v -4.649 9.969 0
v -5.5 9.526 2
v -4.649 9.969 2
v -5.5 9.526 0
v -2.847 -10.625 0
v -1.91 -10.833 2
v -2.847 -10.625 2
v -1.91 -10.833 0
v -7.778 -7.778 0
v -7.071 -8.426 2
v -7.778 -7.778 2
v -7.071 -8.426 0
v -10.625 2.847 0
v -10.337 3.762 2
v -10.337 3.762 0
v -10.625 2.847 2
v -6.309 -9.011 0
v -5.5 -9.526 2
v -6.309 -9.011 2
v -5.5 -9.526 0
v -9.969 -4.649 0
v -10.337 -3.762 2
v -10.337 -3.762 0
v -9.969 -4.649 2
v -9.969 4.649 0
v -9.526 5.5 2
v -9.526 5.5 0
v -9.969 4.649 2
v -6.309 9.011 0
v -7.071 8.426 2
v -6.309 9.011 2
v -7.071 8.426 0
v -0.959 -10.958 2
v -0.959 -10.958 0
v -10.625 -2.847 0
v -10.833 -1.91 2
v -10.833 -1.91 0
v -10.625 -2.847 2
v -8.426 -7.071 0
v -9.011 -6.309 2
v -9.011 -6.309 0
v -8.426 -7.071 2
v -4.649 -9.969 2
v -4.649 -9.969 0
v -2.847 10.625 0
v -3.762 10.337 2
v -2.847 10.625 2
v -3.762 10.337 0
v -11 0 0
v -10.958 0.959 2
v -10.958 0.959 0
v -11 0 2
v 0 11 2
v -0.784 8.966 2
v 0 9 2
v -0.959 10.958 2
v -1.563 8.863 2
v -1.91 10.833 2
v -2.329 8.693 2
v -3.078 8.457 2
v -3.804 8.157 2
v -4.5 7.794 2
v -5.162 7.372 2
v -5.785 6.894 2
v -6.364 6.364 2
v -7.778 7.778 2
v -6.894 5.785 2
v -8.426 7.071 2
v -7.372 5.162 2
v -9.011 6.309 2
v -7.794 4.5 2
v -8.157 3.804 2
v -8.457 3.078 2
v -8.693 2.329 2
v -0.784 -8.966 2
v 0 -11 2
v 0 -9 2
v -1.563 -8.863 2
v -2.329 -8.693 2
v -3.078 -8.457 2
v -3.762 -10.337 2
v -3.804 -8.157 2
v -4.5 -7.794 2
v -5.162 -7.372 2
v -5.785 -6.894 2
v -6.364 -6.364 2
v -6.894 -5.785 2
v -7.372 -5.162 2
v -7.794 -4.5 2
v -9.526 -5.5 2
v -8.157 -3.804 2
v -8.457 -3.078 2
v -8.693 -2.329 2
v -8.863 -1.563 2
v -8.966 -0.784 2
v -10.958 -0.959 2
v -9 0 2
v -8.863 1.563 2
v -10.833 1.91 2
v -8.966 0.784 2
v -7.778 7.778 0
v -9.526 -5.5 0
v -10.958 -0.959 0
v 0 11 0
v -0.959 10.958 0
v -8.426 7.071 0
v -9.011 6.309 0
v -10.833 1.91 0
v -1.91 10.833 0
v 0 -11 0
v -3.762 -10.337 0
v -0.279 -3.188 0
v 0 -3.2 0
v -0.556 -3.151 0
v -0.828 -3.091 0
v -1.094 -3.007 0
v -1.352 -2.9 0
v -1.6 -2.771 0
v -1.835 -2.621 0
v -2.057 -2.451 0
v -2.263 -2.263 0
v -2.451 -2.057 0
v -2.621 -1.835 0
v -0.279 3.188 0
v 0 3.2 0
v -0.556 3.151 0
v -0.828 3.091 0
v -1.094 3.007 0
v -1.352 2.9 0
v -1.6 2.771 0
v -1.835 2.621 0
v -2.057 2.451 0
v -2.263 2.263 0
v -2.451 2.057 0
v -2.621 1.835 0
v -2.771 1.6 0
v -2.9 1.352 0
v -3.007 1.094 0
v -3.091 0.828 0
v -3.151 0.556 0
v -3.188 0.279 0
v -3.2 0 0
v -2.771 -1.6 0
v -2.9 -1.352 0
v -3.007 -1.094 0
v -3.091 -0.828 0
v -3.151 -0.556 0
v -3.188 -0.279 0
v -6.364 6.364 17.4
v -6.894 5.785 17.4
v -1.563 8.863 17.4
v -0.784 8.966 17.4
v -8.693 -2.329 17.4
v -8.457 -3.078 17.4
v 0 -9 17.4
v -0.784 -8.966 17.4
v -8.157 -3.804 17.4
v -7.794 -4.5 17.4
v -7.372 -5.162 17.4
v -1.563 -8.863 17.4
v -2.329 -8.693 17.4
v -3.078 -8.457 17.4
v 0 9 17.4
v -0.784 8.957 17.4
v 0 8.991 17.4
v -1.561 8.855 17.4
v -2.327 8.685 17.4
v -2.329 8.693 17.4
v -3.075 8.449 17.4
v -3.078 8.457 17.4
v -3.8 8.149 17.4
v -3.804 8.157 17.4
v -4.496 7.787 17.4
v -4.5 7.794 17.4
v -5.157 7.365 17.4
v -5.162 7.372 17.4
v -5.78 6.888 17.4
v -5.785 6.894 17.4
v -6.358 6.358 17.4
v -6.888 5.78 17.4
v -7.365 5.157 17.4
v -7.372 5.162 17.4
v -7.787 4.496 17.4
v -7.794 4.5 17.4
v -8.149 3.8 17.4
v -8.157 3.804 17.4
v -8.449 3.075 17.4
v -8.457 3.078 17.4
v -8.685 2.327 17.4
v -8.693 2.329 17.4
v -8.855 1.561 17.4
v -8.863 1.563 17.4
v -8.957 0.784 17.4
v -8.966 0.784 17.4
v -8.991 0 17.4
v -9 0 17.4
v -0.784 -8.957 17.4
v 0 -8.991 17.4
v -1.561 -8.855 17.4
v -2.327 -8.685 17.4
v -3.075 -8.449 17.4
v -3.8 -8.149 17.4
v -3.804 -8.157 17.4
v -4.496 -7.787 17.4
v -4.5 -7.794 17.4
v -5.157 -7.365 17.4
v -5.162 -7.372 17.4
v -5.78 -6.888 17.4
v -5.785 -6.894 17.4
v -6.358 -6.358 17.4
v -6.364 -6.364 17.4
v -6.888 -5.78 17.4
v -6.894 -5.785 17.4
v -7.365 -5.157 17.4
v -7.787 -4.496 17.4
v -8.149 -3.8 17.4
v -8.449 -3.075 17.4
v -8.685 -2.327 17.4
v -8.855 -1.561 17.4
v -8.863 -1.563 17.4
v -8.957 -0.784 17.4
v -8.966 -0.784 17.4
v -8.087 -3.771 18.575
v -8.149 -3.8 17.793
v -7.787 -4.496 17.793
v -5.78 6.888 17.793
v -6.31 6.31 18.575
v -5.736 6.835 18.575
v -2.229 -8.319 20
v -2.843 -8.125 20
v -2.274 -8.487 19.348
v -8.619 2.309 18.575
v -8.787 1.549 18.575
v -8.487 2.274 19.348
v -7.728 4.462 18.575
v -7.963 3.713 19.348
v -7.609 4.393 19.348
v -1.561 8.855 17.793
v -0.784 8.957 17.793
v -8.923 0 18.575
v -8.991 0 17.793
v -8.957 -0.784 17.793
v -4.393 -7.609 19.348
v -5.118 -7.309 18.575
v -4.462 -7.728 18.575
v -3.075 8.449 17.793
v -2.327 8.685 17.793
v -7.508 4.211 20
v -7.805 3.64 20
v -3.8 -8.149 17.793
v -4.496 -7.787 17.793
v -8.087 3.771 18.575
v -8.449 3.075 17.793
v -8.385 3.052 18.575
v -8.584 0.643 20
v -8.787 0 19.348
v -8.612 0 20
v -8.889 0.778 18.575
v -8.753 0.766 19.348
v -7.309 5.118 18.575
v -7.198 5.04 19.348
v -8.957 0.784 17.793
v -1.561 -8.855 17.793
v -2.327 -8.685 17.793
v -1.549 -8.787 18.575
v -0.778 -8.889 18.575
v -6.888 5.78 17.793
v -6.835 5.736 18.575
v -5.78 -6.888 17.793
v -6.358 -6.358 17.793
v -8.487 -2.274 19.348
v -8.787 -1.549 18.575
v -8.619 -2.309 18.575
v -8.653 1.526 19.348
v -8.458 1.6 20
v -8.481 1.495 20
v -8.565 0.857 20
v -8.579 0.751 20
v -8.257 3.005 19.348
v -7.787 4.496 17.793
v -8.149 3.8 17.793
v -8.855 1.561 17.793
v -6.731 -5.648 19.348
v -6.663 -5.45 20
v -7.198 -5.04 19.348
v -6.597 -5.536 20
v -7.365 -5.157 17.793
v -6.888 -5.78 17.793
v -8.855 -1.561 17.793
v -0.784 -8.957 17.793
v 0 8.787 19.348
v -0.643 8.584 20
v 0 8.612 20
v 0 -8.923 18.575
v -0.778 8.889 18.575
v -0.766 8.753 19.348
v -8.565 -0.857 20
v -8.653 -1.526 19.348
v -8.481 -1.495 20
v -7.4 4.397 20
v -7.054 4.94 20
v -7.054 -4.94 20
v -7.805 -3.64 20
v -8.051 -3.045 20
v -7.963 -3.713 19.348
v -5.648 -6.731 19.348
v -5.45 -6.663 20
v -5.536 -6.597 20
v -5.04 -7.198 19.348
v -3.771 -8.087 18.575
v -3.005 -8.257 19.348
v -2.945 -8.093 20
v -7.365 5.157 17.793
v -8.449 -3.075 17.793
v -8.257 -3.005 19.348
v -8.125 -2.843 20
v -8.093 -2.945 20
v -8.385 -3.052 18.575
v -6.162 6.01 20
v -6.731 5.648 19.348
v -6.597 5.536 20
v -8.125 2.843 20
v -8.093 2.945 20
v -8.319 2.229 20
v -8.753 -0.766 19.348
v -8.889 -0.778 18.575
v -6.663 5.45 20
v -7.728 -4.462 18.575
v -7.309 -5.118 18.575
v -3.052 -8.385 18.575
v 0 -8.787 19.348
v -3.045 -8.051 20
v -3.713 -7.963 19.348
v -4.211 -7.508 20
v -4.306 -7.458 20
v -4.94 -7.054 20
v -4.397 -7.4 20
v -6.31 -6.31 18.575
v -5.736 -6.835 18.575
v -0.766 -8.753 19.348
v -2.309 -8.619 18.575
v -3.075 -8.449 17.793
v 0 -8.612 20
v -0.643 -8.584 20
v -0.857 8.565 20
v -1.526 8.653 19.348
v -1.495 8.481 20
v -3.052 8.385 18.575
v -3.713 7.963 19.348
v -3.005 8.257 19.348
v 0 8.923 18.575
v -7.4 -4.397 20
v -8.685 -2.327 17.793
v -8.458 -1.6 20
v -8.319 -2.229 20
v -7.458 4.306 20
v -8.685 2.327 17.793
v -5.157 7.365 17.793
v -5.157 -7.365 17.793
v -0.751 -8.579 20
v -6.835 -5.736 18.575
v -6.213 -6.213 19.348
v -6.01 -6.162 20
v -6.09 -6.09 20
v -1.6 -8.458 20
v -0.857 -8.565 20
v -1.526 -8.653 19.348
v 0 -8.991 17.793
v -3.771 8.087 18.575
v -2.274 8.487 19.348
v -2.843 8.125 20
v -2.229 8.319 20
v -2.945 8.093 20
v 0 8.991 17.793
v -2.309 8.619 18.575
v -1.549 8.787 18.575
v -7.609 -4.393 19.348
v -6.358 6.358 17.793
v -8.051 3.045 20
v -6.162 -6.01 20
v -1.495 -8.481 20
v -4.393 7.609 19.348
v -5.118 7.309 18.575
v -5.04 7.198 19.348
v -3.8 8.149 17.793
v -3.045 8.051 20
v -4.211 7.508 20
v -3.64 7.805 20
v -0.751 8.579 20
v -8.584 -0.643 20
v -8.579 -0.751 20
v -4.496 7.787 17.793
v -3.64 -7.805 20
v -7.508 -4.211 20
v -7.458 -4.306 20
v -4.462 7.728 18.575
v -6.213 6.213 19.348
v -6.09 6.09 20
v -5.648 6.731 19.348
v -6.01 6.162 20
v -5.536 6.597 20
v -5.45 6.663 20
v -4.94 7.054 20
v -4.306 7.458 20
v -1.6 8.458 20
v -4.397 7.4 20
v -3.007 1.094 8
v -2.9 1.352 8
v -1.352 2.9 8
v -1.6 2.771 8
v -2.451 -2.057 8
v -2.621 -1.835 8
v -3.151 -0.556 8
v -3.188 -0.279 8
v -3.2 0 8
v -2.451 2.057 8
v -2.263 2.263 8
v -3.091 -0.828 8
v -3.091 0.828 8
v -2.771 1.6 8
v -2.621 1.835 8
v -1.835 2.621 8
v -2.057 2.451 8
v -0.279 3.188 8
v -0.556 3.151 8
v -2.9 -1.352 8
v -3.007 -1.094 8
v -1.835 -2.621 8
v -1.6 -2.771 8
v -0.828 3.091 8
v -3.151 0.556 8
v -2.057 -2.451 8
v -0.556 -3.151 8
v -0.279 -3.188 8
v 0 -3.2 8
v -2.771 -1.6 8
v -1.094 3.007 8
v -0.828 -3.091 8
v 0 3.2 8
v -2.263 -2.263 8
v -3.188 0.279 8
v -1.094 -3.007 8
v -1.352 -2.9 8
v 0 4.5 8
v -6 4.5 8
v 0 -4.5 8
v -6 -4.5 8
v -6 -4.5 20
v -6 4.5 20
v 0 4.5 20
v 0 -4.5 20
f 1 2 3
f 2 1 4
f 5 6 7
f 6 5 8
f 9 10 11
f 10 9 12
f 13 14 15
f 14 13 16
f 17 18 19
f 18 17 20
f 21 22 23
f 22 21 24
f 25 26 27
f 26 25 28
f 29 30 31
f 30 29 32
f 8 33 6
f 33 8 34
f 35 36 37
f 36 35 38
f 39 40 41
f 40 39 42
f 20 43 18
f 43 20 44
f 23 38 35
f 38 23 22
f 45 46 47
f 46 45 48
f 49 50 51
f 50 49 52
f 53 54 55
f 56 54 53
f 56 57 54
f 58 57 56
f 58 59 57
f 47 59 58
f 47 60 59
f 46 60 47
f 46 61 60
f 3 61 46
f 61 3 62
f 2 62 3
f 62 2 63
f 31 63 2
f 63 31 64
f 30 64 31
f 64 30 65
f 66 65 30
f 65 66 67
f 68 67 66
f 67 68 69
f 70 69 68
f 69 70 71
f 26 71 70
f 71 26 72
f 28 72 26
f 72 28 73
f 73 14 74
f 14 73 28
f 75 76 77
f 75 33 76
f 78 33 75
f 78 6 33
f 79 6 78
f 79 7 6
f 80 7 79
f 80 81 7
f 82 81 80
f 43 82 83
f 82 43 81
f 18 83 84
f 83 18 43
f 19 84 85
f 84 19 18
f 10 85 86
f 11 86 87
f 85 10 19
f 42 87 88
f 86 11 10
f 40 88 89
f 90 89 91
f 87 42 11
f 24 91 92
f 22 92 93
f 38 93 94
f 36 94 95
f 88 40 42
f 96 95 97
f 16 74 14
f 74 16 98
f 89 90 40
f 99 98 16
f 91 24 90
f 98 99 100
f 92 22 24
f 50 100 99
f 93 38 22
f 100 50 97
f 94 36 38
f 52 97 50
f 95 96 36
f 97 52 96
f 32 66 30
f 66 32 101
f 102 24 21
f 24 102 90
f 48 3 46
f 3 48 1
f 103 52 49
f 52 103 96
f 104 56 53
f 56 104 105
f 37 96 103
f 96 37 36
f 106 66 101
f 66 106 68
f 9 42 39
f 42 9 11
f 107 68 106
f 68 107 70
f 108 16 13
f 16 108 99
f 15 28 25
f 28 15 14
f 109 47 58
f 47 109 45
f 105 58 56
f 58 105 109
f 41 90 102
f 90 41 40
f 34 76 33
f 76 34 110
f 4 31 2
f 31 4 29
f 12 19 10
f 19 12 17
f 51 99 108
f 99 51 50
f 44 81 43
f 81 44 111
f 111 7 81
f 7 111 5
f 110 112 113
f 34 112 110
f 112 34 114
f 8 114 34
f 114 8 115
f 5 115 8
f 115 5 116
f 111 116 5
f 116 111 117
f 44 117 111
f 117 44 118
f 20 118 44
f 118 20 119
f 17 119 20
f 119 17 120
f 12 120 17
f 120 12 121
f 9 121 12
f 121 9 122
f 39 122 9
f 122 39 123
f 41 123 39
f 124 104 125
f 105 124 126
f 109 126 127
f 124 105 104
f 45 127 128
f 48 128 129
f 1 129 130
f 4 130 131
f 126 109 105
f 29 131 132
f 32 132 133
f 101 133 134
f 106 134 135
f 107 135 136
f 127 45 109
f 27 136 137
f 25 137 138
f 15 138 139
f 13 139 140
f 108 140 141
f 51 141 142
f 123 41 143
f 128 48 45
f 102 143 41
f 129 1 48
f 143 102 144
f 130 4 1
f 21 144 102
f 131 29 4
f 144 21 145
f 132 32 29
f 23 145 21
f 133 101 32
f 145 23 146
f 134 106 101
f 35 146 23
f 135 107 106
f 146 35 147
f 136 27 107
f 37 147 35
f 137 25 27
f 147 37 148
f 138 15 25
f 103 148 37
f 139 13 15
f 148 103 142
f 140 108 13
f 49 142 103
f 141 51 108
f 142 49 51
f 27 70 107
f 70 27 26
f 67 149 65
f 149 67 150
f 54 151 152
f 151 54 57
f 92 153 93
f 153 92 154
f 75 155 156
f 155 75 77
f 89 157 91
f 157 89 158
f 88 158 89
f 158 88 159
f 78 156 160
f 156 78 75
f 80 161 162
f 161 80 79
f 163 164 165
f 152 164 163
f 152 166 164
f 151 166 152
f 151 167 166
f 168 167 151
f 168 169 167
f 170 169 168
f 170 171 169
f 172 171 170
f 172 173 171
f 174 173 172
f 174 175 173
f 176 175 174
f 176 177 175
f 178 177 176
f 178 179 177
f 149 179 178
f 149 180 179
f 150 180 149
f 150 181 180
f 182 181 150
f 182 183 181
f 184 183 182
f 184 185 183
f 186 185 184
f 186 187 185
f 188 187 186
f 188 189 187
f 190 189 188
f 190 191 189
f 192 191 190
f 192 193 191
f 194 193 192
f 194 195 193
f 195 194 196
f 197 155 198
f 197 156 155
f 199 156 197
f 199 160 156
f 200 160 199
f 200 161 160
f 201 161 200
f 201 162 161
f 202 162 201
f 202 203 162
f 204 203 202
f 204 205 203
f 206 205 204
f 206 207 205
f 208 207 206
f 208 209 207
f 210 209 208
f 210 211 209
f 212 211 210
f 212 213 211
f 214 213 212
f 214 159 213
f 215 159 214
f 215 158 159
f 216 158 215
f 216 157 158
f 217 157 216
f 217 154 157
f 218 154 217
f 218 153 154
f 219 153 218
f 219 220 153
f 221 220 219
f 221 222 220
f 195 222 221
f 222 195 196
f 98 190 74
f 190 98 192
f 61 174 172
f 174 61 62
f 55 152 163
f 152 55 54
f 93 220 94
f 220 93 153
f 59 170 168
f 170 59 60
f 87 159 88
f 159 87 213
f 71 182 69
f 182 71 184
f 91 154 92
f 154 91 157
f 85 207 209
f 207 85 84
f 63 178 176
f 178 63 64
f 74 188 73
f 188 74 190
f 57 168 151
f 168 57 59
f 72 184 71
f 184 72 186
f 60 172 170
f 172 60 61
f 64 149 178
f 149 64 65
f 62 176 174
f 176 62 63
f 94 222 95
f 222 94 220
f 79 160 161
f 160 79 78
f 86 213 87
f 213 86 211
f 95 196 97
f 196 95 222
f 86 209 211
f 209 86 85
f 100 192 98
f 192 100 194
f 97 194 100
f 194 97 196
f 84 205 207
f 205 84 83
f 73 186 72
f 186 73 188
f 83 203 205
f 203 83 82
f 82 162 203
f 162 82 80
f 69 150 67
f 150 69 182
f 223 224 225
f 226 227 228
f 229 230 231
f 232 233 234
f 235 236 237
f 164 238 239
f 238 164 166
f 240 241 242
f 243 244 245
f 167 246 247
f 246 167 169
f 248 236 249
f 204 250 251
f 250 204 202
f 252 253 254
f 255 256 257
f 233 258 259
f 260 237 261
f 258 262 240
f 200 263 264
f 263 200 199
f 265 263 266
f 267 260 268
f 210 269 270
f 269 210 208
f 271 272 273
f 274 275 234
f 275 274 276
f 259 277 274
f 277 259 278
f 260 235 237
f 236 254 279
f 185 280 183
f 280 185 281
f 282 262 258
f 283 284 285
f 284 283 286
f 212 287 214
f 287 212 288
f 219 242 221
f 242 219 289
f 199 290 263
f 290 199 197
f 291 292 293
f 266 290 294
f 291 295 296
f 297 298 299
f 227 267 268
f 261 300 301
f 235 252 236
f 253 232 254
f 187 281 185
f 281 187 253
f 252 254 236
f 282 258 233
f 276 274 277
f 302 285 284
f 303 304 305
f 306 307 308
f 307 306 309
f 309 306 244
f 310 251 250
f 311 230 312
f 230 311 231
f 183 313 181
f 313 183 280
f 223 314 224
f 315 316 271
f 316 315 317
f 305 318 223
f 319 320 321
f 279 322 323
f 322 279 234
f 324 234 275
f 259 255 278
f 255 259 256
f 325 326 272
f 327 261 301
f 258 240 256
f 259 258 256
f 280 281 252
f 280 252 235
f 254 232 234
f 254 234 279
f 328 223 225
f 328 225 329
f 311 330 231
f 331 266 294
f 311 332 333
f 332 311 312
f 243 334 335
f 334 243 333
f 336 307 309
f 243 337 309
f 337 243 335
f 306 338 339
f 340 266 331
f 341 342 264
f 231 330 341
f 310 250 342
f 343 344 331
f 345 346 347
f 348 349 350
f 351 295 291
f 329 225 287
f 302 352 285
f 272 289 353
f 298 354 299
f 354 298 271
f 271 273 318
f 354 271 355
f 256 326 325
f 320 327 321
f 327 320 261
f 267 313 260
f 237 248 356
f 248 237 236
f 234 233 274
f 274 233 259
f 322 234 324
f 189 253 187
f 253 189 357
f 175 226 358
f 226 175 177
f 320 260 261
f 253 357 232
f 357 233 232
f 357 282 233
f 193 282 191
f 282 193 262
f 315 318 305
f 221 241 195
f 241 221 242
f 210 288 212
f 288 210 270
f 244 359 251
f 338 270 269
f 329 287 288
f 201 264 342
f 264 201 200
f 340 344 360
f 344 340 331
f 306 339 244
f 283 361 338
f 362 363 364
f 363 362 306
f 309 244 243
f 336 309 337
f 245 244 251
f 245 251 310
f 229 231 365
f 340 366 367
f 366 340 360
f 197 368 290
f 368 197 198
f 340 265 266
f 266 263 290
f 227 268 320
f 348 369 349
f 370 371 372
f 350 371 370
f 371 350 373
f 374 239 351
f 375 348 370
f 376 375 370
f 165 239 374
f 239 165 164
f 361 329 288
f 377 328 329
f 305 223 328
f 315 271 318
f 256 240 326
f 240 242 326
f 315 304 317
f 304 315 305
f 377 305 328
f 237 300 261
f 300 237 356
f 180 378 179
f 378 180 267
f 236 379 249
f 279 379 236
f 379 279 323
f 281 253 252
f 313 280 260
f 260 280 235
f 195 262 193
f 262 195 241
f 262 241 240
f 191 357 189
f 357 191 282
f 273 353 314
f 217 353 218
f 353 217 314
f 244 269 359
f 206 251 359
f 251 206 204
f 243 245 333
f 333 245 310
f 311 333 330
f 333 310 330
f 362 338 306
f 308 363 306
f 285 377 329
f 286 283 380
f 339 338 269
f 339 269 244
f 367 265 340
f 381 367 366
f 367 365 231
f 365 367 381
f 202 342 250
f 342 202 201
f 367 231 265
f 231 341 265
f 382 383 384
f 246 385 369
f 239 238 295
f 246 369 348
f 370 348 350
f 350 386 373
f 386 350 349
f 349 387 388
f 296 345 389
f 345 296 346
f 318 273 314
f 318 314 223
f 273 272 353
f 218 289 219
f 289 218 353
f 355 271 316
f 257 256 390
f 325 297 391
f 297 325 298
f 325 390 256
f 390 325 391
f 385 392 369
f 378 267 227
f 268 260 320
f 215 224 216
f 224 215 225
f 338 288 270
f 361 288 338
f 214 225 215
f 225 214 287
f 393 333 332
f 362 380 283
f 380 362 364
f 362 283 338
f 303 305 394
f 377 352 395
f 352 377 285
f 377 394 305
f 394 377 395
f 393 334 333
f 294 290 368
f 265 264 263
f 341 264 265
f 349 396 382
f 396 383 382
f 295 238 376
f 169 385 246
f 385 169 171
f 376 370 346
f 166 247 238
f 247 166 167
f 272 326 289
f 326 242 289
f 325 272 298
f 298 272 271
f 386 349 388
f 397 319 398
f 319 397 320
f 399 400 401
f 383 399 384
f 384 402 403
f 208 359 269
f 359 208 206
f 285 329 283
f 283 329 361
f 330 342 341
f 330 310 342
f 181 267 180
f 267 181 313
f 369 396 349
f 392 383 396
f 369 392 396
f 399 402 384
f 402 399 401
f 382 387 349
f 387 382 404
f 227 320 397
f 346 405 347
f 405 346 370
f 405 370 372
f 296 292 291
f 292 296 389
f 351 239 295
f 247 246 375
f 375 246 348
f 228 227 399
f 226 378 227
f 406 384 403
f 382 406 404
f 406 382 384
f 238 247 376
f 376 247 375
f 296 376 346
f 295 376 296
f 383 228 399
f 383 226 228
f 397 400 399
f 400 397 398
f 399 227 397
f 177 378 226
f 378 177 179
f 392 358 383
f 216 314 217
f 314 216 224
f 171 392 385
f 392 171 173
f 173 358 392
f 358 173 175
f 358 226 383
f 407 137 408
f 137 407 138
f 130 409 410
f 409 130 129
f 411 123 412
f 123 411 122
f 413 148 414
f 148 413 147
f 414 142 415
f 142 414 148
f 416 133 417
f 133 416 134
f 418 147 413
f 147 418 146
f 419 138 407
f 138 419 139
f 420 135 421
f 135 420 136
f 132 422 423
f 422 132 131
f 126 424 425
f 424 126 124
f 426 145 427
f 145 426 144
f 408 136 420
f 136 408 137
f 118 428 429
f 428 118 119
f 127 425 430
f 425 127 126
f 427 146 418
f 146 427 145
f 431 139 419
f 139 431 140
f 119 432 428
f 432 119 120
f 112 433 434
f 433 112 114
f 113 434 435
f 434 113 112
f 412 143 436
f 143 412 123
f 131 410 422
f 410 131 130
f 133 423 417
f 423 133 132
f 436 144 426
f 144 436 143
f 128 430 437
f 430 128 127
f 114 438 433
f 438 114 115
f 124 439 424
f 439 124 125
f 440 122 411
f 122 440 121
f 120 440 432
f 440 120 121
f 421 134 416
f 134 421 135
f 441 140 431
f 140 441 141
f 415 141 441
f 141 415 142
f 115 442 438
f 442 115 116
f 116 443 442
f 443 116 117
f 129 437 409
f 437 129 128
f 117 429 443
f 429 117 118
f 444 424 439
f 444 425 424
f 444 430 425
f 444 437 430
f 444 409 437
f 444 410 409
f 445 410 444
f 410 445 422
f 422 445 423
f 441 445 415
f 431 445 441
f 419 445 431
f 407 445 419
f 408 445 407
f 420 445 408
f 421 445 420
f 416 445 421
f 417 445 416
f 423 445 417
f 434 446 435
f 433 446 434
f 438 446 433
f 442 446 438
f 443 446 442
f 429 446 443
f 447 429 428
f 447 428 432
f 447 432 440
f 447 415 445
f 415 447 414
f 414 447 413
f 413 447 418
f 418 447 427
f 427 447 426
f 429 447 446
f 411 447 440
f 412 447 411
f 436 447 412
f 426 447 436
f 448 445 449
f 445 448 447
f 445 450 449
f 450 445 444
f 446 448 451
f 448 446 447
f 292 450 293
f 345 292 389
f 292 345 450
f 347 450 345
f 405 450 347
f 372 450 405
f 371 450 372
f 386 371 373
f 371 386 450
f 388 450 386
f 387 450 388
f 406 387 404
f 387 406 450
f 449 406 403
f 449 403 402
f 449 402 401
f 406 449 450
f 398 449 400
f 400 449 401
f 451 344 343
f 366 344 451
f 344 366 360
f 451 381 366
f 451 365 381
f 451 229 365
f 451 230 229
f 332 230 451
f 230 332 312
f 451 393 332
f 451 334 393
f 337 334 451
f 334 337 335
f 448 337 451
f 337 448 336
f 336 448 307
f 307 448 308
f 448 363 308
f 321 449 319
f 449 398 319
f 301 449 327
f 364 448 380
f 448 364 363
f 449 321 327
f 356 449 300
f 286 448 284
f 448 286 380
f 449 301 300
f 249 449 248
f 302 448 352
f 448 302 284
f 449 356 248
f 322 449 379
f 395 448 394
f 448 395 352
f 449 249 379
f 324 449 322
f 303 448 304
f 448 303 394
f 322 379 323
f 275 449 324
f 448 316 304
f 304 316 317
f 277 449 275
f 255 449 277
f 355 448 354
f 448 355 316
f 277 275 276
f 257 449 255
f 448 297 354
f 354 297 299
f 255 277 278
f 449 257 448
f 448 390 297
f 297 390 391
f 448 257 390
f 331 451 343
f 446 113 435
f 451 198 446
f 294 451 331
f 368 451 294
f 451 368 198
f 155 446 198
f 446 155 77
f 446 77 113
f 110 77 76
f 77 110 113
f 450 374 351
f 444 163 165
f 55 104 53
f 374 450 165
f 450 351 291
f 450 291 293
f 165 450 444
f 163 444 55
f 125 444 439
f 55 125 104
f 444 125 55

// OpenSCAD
// CC BY-SA, FHNW (University of Applied Sciences and Arts Northwestern Switzerland)

$fn = 72;

d_rj45 = 6.4; //6;
r = d_rj45 / 2;
dz = -2; //0;

difference() {
  union() {
    cylinder(2, 11, 11);
    cylinder(19.4 + dz, 9, 9);
    translate([0, 0, 19.4 + dz]) sphere(9);
  }
  # translate([0, 0, -5]) cylinder(40, r, r);
  # translate([-6, -4.5, 10 + dz]) cube([12, 9, 20]);
   translate([-12, -12, 22 + dz]) cube([24, 24, 10]);
   translate([0, -12, -1]) cube([12, 24, 32]);
}
